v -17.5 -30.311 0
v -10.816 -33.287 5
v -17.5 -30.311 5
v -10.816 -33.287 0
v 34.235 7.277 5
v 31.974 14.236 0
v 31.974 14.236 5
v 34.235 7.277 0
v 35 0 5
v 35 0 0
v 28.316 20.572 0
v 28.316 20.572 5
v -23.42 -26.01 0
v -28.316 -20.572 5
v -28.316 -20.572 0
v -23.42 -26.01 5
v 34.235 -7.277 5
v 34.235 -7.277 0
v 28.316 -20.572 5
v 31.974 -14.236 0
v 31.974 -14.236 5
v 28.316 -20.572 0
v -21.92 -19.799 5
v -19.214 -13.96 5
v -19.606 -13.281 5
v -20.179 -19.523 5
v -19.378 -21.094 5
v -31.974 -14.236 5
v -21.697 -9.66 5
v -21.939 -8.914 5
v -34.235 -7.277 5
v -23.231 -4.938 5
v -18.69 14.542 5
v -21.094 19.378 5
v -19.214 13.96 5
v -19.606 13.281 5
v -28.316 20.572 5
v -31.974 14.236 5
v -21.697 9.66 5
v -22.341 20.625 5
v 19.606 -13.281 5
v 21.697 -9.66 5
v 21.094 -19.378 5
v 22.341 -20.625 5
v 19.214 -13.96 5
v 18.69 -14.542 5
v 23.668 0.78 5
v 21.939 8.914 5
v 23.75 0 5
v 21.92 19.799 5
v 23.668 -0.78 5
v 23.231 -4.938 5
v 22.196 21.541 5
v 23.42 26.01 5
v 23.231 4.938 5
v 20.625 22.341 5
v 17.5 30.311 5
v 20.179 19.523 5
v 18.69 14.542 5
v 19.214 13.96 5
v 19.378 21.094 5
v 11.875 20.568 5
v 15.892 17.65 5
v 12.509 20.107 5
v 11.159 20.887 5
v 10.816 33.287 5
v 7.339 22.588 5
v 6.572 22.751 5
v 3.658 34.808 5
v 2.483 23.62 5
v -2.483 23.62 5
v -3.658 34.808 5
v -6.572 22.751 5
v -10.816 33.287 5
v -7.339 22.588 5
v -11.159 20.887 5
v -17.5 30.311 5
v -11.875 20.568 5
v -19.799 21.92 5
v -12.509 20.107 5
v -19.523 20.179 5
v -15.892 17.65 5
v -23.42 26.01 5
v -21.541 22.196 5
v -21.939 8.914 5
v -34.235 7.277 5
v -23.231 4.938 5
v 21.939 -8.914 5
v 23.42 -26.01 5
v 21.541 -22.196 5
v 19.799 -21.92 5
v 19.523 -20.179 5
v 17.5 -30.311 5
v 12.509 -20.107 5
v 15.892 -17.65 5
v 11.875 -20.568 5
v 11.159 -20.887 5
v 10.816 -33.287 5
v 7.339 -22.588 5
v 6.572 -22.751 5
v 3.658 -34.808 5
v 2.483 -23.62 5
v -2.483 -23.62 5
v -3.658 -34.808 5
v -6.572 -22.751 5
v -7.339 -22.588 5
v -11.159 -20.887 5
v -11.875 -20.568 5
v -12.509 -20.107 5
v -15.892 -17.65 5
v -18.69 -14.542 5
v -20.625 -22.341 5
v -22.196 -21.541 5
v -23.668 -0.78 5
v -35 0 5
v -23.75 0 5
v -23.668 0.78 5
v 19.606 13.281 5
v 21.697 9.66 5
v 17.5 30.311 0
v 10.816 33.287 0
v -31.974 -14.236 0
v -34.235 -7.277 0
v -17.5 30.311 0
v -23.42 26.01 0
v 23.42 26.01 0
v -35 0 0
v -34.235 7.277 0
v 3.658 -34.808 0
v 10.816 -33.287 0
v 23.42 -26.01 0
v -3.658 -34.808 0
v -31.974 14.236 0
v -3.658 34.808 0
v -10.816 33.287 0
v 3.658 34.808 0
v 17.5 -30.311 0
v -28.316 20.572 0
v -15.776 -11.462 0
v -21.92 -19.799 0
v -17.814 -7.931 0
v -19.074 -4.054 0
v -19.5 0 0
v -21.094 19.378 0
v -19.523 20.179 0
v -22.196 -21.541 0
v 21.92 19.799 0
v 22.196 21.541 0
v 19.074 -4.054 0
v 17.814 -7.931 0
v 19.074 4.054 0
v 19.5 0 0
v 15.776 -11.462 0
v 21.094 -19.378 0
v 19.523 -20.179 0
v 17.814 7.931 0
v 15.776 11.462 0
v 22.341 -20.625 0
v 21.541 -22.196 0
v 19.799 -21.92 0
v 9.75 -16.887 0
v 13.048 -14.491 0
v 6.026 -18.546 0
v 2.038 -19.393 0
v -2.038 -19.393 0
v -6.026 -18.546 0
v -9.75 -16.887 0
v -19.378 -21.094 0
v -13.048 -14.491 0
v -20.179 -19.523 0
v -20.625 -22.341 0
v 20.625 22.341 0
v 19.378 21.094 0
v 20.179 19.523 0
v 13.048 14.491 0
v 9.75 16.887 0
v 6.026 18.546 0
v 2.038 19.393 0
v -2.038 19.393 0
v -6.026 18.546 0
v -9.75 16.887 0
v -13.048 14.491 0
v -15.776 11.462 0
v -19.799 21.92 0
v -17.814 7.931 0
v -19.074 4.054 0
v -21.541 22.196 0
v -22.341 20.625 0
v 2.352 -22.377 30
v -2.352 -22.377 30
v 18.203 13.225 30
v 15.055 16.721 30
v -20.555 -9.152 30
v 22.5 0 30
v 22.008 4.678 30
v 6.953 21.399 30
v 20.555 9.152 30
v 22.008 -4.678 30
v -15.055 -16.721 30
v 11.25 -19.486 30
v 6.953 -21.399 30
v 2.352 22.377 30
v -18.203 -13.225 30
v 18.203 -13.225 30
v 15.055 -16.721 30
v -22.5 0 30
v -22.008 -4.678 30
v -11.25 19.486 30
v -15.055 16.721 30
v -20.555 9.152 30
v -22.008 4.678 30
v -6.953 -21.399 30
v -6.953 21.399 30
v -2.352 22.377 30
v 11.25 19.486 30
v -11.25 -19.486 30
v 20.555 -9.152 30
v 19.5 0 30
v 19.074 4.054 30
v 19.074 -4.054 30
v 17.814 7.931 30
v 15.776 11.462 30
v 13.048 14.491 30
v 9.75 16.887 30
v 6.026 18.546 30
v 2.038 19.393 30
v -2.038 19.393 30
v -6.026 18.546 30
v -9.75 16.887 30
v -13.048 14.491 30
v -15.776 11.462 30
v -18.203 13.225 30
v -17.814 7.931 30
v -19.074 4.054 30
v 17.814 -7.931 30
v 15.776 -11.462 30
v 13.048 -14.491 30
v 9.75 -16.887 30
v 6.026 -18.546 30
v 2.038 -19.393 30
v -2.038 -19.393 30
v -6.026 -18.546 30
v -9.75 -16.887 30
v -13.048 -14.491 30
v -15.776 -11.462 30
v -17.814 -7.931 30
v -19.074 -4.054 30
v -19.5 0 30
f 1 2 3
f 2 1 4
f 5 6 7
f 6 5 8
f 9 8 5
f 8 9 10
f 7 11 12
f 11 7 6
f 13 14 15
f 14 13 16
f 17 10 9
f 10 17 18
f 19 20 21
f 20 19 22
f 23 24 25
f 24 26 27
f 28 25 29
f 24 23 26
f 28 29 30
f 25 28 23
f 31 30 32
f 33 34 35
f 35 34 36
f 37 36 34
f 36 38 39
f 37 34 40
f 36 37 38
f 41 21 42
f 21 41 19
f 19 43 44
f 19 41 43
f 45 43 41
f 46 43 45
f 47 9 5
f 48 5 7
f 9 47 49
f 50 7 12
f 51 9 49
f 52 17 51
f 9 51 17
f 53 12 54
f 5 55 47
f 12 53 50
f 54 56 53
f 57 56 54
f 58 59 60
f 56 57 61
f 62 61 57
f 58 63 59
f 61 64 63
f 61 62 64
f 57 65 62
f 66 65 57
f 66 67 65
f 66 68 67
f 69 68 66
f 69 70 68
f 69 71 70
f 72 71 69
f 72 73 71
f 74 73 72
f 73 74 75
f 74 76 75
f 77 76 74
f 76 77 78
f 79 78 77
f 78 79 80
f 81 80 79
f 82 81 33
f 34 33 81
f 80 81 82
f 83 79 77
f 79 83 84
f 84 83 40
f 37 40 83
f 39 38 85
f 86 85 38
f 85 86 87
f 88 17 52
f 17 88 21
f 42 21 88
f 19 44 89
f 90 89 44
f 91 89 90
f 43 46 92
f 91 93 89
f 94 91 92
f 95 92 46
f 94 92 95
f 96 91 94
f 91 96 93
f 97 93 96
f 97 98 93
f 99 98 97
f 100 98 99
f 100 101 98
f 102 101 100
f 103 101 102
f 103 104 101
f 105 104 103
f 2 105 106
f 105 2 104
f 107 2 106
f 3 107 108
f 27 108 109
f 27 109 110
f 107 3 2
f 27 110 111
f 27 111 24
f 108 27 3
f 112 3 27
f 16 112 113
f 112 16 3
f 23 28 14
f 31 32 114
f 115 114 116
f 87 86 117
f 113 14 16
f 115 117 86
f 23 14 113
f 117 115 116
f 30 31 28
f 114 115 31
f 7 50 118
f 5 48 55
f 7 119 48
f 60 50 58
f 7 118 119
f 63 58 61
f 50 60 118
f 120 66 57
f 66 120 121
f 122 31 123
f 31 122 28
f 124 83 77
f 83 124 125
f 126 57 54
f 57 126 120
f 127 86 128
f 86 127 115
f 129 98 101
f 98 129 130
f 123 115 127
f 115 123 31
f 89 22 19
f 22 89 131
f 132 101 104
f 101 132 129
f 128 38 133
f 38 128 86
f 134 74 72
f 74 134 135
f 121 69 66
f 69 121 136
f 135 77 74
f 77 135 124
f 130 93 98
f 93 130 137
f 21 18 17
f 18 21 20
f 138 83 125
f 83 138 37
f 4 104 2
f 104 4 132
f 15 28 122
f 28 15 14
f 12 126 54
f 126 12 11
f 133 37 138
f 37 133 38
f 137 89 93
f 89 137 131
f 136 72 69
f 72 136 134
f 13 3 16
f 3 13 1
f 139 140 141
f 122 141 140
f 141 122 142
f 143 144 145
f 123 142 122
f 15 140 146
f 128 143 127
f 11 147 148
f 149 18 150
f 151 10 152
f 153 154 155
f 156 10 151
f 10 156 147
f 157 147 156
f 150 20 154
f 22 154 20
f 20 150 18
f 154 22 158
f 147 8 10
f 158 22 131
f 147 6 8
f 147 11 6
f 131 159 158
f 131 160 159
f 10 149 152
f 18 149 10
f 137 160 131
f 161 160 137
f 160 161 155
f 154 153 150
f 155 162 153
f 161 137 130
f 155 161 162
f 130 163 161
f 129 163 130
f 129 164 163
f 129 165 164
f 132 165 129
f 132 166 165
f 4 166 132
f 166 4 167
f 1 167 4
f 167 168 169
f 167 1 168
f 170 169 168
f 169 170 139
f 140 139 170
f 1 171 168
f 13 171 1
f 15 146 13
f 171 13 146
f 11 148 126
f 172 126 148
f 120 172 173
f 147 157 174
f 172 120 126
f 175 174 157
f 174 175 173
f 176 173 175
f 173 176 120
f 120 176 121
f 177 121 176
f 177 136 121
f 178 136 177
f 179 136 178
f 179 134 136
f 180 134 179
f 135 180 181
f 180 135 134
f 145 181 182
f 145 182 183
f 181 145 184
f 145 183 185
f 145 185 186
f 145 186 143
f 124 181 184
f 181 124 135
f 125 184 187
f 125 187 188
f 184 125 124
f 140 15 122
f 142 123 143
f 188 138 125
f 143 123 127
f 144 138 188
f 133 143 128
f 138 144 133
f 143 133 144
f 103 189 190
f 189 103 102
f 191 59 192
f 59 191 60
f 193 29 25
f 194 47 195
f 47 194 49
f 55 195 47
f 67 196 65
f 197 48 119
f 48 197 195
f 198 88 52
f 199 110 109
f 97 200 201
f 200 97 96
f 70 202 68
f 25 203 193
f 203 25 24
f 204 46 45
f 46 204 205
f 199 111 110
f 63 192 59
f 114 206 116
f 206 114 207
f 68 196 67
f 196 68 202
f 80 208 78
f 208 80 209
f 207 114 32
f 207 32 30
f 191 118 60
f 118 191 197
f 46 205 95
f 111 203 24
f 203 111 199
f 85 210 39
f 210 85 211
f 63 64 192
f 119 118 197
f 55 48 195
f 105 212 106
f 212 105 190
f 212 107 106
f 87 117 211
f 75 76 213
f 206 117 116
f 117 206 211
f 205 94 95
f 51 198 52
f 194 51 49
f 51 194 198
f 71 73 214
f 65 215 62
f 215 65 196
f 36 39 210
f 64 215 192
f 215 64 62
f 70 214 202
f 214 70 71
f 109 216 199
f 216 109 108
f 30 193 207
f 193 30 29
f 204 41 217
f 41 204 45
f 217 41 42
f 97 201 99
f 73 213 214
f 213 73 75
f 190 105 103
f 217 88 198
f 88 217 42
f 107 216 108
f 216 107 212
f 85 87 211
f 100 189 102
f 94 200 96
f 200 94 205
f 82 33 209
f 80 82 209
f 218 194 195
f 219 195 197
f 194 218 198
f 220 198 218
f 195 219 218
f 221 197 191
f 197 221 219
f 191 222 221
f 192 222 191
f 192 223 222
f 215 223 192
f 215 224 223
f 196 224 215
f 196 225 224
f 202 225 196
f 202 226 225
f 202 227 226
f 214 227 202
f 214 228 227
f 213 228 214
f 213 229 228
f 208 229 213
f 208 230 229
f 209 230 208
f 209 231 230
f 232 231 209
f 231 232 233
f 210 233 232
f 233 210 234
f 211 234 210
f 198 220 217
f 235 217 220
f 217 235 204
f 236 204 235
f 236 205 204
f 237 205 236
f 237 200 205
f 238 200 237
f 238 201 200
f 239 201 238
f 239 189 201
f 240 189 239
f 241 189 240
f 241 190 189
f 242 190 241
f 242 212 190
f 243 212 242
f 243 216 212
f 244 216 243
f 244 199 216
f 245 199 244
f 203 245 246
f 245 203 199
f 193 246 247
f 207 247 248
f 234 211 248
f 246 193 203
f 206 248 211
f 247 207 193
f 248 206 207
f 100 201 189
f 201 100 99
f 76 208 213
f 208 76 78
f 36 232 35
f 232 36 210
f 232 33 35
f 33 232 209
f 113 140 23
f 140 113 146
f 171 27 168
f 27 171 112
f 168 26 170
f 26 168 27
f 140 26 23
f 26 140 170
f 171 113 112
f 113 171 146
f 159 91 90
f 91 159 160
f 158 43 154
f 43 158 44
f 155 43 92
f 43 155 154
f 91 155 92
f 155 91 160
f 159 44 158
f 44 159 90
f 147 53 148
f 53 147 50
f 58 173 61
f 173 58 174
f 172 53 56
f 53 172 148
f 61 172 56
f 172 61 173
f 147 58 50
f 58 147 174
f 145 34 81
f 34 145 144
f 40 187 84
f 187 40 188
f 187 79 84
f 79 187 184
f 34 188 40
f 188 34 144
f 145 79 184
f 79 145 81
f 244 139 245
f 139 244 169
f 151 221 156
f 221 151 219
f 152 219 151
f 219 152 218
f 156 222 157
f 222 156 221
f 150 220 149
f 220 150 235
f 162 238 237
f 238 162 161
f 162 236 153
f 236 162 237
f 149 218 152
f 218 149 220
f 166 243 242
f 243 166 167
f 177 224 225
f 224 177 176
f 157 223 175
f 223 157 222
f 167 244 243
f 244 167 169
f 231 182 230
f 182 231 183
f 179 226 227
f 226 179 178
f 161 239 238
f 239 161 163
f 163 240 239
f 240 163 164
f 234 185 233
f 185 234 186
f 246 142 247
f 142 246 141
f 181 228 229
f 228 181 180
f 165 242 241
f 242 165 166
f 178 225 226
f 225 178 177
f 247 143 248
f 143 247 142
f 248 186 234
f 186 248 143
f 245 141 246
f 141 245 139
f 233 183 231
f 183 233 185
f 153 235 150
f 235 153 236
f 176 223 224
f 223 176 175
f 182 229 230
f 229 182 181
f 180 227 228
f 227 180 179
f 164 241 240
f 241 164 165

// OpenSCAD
//for(i=[-1,1]) rotate(90) translate([25*i/2, 50, 0])cylinder(h=20,r=1.5);
  
difference(){
    union(){
        cylinder(h=5,r=35);
        cylinder(h=30, r1=48/2, r2=45/2);
    }
    translate([0,0, 0]) for(j=[1:4]) 
        rotate(90*j+45) translate([0,45/2+7,0]) cylinder(h=25, r=1.5, center=true);
    
    cylinder(h=150, r=38/2+0.5, center=true);
}
